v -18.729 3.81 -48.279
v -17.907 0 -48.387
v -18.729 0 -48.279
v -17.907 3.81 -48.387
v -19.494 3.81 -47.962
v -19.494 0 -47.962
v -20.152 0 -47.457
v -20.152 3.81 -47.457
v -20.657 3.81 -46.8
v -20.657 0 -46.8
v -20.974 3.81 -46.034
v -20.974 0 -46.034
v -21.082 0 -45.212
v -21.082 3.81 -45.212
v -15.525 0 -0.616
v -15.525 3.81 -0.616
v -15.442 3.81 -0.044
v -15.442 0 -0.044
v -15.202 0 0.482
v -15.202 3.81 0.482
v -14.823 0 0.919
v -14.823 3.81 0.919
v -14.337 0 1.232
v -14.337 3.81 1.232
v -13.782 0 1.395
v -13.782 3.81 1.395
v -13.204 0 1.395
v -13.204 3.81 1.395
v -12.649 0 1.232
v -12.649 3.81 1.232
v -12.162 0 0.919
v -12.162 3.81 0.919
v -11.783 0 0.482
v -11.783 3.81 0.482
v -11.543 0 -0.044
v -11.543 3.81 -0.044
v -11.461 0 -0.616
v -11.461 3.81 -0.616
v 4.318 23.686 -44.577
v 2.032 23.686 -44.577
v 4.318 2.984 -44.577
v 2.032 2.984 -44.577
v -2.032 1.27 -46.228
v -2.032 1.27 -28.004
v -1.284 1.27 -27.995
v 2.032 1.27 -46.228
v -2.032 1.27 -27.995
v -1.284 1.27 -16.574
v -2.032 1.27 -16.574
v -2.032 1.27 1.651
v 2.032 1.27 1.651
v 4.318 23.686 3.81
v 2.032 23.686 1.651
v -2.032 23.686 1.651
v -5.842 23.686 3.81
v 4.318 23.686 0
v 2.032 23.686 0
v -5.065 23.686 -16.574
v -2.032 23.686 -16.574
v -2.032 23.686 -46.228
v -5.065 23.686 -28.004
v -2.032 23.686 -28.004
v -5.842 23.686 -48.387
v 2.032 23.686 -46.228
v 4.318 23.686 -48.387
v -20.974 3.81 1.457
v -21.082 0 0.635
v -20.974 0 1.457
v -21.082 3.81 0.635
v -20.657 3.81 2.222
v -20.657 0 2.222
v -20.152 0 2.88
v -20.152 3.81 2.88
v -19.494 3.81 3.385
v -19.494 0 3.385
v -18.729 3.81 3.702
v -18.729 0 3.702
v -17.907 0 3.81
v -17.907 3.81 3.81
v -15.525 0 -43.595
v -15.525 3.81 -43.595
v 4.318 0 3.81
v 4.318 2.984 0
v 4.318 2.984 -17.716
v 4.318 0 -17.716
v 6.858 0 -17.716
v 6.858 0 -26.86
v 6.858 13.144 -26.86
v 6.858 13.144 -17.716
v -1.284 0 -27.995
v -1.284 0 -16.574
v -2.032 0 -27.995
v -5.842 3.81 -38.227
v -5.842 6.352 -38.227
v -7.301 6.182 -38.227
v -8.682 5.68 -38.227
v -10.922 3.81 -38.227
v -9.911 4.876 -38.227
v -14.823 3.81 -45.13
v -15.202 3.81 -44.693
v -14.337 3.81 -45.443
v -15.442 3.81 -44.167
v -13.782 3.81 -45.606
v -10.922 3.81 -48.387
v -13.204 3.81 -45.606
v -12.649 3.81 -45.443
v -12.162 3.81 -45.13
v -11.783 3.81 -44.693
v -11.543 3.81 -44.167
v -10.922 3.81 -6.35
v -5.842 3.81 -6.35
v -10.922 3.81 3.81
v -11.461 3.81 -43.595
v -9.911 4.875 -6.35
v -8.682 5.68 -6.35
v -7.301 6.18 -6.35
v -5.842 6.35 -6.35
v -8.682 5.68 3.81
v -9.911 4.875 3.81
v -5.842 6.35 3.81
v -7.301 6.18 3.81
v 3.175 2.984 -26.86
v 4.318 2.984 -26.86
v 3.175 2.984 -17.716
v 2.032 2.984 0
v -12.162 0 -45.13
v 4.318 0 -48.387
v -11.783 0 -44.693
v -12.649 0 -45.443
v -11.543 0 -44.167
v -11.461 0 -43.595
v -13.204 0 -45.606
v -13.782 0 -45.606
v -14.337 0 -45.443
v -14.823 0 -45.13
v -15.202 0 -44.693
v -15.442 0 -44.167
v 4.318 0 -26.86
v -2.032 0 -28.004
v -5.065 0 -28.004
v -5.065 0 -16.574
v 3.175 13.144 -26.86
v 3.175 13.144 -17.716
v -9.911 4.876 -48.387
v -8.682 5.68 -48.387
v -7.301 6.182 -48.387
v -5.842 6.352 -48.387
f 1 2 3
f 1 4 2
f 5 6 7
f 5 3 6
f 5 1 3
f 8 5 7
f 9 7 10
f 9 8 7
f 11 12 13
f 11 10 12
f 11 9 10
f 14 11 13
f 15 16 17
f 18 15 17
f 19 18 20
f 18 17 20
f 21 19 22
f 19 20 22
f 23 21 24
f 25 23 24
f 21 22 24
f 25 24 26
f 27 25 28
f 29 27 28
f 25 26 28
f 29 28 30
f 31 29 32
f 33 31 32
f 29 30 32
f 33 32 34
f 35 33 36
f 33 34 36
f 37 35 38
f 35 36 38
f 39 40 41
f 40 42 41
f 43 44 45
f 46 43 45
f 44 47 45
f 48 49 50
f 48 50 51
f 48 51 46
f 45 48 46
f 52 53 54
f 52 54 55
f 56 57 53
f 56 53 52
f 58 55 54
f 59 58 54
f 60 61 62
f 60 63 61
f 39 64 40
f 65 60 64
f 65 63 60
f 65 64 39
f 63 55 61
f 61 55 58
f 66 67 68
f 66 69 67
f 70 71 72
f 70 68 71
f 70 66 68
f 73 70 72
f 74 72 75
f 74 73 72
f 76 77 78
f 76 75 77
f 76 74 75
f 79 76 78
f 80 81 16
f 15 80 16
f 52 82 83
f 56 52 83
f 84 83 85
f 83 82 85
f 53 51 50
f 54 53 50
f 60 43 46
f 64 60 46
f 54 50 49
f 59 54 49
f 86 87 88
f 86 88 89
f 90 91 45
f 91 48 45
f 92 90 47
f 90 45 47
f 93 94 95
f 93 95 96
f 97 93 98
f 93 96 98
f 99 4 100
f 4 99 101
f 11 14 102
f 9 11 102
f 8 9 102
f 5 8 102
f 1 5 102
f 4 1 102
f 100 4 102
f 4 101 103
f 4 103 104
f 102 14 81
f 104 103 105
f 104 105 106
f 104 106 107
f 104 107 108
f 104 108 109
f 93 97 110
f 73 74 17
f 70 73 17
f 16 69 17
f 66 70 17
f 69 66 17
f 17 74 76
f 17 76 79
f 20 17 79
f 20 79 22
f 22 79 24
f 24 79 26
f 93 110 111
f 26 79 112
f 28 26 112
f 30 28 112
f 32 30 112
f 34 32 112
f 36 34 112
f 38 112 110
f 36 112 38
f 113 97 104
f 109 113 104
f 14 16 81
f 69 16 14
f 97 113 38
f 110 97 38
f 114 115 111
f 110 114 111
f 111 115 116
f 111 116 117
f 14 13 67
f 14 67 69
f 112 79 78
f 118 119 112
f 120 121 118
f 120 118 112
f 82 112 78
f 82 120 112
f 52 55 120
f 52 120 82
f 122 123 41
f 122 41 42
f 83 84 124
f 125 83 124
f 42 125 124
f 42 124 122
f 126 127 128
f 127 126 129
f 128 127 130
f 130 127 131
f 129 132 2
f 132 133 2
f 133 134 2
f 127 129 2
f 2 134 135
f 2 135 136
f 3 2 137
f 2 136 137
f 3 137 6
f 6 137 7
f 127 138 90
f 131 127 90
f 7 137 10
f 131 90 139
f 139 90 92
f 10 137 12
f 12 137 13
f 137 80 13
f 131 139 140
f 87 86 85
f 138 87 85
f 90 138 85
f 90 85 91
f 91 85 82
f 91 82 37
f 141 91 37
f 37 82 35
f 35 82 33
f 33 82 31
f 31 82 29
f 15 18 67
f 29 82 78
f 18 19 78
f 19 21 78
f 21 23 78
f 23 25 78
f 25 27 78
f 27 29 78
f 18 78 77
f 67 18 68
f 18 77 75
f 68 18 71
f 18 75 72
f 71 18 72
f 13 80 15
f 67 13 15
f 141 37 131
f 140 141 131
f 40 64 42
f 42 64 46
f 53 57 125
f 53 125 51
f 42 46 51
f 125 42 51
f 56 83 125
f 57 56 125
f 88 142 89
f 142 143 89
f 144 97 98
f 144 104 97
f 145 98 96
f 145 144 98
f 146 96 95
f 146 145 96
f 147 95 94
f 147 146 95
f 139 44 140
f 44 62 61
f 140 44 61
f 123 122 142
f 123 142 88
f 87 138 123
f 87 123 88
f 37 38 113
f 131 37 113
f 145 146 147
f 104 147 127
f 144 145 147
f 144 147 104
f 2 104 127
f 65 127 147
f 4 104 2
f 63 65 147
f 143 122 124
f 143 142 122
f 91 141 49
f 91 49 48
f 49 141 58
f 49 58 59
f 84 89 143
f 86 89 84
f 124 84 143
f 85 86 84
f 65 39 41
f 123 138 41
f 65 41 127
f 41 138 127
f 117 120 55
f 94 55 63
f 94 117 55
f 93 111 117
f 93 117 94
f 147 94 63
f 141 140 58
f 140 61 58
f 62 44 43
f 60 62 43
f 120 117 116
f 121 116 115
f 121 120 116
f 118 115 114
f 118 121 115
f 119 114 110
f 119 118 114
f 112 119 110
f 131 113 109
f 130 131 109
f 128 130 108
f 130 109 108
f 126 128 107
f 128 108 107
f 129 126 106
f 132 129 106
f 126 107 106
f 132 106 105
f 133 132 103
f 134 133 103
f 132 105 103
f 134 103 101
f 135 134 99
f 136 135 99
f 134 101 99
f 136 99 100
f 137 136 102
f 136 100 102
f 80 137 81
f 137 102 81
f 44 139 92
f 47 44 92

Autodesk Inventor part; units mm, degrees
ref_plane "YZ Plane" through (0, 0, 0) normal (1, 0, 0) x (0, 1, 0)
ref_plane "XZ Plane" through (0, 0, 0) normal (0, 1, 0) x (-1, 0, 0)
ref_plane "XY Plane" through (0, 0, 0) normal (0, 0, 1) x (1, 0, 0)
sketch "Sketch1" plane through (0, 0, 0) normal (0, 1, 0) x (-1, 0, 0)
  line L0 (0, 0) -> (2.032, 0) construction
  line L1 (0, 0) -> (-2.032, 0) construction
  line L2 (-4.318, 0) -> (-4.318, 3.81)
  line L3 (-4.318, 3.81) -> (5.842, 3.81)
  line L4 (-2.032, 0) -> (-2.032, 1.651)
  line L5 (-2.032, 1.651) -> (2.032, 1.651)
  line L6 (2.032, -46.228) -> (-2.032, -46.228)
  line L7 (-2.032, -46.228) -> (-2.032, -44.577)
  line L8 (-4.318, -44.577) -> (-4.318, -48.387)
  line L9 (-4.318, -48.387) -> (5.842, -48.387)
  line L10 (2.032, 1.651) -> (2.032, -16.5735)
  line L11 (2.032, -16.5735) -> (4.572, -16.5735)
  line L12 (4.572, -16.5735) -> (4.572, -28.0035)
  line L13 (4.572, -28.0035) -> (2.032, -28.0035)
  line L14 (2.032, -28.0035) -> (2.032, -46.228)
  line L15 (5.842, 3.81) -> (5.842, -48.387)
  line L16 (-2.032, -40.8058) -> (4.191, -40.8058) construction
  line L17 (-2.032, 0) -> (-2.032, -44.577)
  line L18 (-4.318, 0) -> (-4.318, -44.577)
  dimension "d0" = 2.032
  dimension "d1" = 2.032
  dimension "d3" = 2.286
  dimension "d5" = 3.81
  dimension "d7" = 10.16
  dimension "d8" = 4.064
  dimension "d9" = 2.159
  dimension "d10" = 1.651
  dimension "d12" = 2.286
  dimension "d13" = 3.81
  dimension "d14" = 1.651
  dimension "d15" = 4.064
  dimension "d16" = 10.16
  dimension "d17" = 11.43
  dimension "d18" = 2.159
  dimension "d19" = 18.2245
  dimension "d21" = 6.223
  dimension "d22" = 2.54
  dimension "d37" = 18.2245
  dimension "d38" = 52.197
  dimension "d39" = 44.577
extrude "Extrusion1" add sketch "Sketch1" along normal blind 2.9845
sketch "Sketch10" plane through (0, 0, 0) normal (0, -1, 0) x (1, 0, 0)
  line L0 (-2.032, 1.651) -> (-2.032, -16.5735) projected
  line L1 (2.032, -46.228) -> (2.032, 1.651) projected
  line L2 (-2.032, 1.651) -> (2.032, 1.651)
  line L3 (2.032, 1.651) -> (2.032, -46.228)
  line L4 (2.032, -46.228) -> (-2.032, -46.228)
  line L5 (-2.032, -46.228) -> (-2.032, 1.651)
  point P0 (0, 0)
extrude "Extrusion5" add sketch "Sketch10" against normal blind 1.27
sketch "Sketch11" plane through (0, 2.9845, 0) normal (0, 1, 0) x (1, 0, 0)
  line L0 (4.318, -3.81) -> (-5.842, -3.81)
  line L1 (-5.842, -3.81) -> (-5.842, 48.387) projected
  line L2 (-5.842, -3.81) -> (-5.842, 48.387)
  line L3 (4.318, 48.387) -> (4.318, 44.577) construction
  line L4 (4.318, -3.81) -> (4.318, 48.387) construction
  line L5 (4.318, -3.81) -> (4.318, 0) construction
  line L6 (4.318, -3.81) -> (4.318, 0)
  line L7 (4.318, 0) -> (2.032, 0)
  line L8 (2.032, 46.228) -> (2.032, -1.651) projected
  line L9 (2.032, -1.651) -> (-2.032, -1.651) projected
  line L10 (2.032, -1.651) -> (-2.032, -1.651)
  line L11 (-2.032, 28.0035) -> (-2.032, 16.5735) projected
  line L12 (-2.032, -1.651) -> (-2.032, 16.5735)
  line L13 (-2.032, -1.651) -> (-2.032, 16.5735) projected
  line L14 (-4.572, 16.5735) -> (-2.032, 16.5735) projected
  line L15 (-2.032, 16.5735) -> (-4.572, 16.5735)
  line L16 (-4.572, 16.5735) -> (-4.572, 28.0035) projected
  line L17 (-4.572, 16.5735) -> (-4.572, 28.0035)
  line L18 (-2.032, 28.0035) -> (-4.572, 28.0035) projected
  line L19 (-4.572, 28.0035) -> (-2.032, 28.0035)
  line L20 (-2.032, 28.0035) -> (-2.032, 46.228)
  line L21 (-2.032, 46.228) -> (2.032, 46.228)
  line L22 (2.032, 46.228) -> (2.032, 44.577)
  line L23 (2.032, 44.577) -> (4.318, 44.577)
  line L24 (4.318, 44.577) -> (4.318, 48.387)
  line L25 (-5.842, 48.387) -> (4.318, 48.387)
  point P0 (0, 0)
  dimension "d43" = 3.81
  dimension "d44" = 3.81
extrude "Extrusion6" add sketch "Sketch11" along normal blind 20.701 contours L0 L1 L25 L24 L23 L8 L21 L20 L18 L16 L14 L12 L9 L7 L6
sketch "Sketch12" plane through (-5.842, 0, 3.81) normal (0, 0, 1) x (1, 0, 0)
  line L0 (0, 0) -> (0, 23.6855) construction
  line L1 (10.16, 0) -> (0, 0) construction
  line L2 (0, 0) -> (0, 23.6855) projected
  line L3 (0, 0) -> (-6.35, 0) construction
  line L4 (0, 0) -> (0, 6.35) construction
  arc A0 (0, 6.35) -> (-6.35, 0) centre (0, 0) ccw
  line L5 (-6.35, 0) -> (0, 0)
  line L6 (0, 0) -> (0, 6.35)
  point P0 (5.842, 0)
  dimension "d54" = 6.35
  dimension "d55" = 6.35
  dimension "d56" = 6.35
extrude "Extrusion7" add sketch "Sketch12" against normal blind 10.16
sketch "Sketch14" plane through (4.318, 0, -48.387) normal (0, 0, -1) x (-1, 0, 0)
  line L0 (10.16, 0) -> (0, 0) projected
  line L1 (10.16, 0) -> (10.16, 6.3521)
  line L2 (10.16, 0) -> (10.16, 23.6855) projected
  line L3 (0, 0) -> (16.51, 0) projected
  line L4 (10.16, 0) -> (16.51, 0)
  arc A0 (16.51, 0) -> (10.16, 6.3521) centre (10.1572, -0.0008) ccw
  point P0 (4.318, 0)
extrude "Extrusion8" add sketch "Sketch14" against normal blind 10.16
sketch "Sketch16" plane through (0, 0, 0) normal (0, -1, 0) x (1, 0, 0)
  line L0 (-12.192, -38.227) -> (-5.842, -38.227) projected
  line L1 (-5.842, -38.227) -> (-21.082, -38.227)
  line L2 (-21.082, -38.227) -> (-21.082, -6.35)
  line L3 (-21.082, -6.35) -> (-5.842, -6.35)
  line L4 (-5.842, -6.35) -> (-5.842, -38.227)
  point P0 (0, 0)
  point P1 (-12.192, -6.35)
  dimension "d63" = 15.24
extrude "Extrusion9" add sketch "Sketch16" against normal blind 3.81
sketch "Sketch17" plane through (0, 3.81, 0) normal (0, 1, 0) x (1, 0, 0)
  circle A0 centre (-13.462, 29.4323) radius 1.9844
  circle A1 centre (-13.2021, 15.1448) radius 1.9844
  line L0 (-5.842, 38.227) -> (-5.842, 6.35) construction
  line L1 (-5.842, 36.0862) -> (-21.082, 36.0862) construction
  line L2 (-21.082, 38.227) -> (-21.082, 6.35) construction
  line L3 (-21.082, 37.0641) -> (-13.462, 37.0641) construction
  line L4 (-10.9221, 38.227) -> (-21.082, 38.227) construction
  line L5 (-12.933, 38.227) -> (-12.933, 6.35) construction
  line L6 (-21.082, 6.35) -> (-12.192, 6.35) construction
  line L7 (-21.082, 6.35) -> (-10.922, 6.35) construction
  line L8 (-5.842, 6.35) -> (-10.922, 6.35) construction
  line L9 (-13.462, 29.4323) -> (-13.462, 38.227) construction
  line L10 (-13.2021, 15.1448) -> (-13.2021, 6.35) construction
  point P0 (0, 0)
  dimension "d66" = 3.9688
  dimension "d67" = 3.9688
  dimension "d68" = 15.24
  dimension "d69" = 7.62
  dimension "d70" = 31.877
  dimension "d72" = 7.62
  dimension "d90" = 14.2875
extrude "Extrusion10" cut sketch "Sketch17" against normal blind 3.81
sketch "Sketch18" plane through (4.318, 0, 3.81) normal (1, 0, 0) x (0, 0, -1)
  line L0 (0, 1.944) -> (52.197, 1.944) construction
  line L1 (52.197, 0) -> (52.197, 6.3521) construction
  line L2 (0, 0) -> (0, 23.6855) construction
  line L3 (0, 2.5647) -> (21.5265, 2.5647) construction
  line L4 (48.387, 2.9845) -> (3.81, 2.9845) projected
  line L5 (21.5265, 2.9845) -> (30.6705, 2.9845)
  line L6 (21.5265, 2.9845) -> (21.5265, 13.1445)
  line L7 (21.5265, 13.1445) -> (30.6705, 13.1445)
  line L8 (30.6705, 13.1445) -> (30.6705, 2.9845)
  point P0 (3.81, 0)
  dimension "d79" = 52.197
  dimension "d80" = 21.5265
  dimension "d82" = 10.16
extrude "Extrusion11" add sketch "Sketch18" against normal blind 2.286
sketch "Sketch20" plane through (0, 23.6855, 0) normal (0, 1, 0) x (1, 0, 0)
  line L0 (-4.572, 16.5735) -> (-4.572, 28.0035) projected
  line L1 (-4.572, 28.0035) -> (-5.0647, 28.0035)
  line L2 (-5.0647, 28.0035) -> (-5.0647, 16.5735)
  line L3 (-5.0647, 16.5735) -> (-4.572, 16.5735)
  line L4 (-4.572, 16.5735) -> (-4.572, 28.0035)
  point P0 (0, 0)
extrude "Extrusion12" cut sketch "Sketch20" against normal up to next
sketch "Sketch21" plane through (0, 1.27, 0) normal (0, 1, 0) x (1, 0, 0)
  line L0 (-2.032, 16.5735) -> (-1.2835, 16.5735)
  line L1 (-1.2835, 16.5735) -> (-1.2835, 27.9949)
  line L2 (-1.2835, 27.9949) -> (-2.032, 27.9949)
  line L3 (-2.032, 27.9949) -> (-2.032, 16.5735)
  point P0 (0, 0)
extrude "Extrusion13" cut sketch "Sketch21" against normal up to next
sketch "Sketch22" plane through (0, 0, 0) normal (0, -1, 0) x (1, 0, 0)
  line L0 (2.032, -26.8605) -> (4.318, -26.8605) projected
  line L1 (4.318, -26.8605) -> (4.318, -17.6876)
  line L2 (4.318, -48.387) -> (4.318, 3.81) projected
  line L3 (4.318, -26.8605) -> (6.858, -26.8605)
  line L4 (6.858, -26.8605) -> (6.858, -17.7165)
  line L5 (6.858, -17.7165) -> (4.318, -17.7165)
  line L6 (4.318, -17.7165) -> (4.318, -26.8605)
  point P0 (0, 0)
  dimension "d91" = 2.54
extrude "Extrusion14" add sketch "Sketch22" against normal up to surface (13.1445 mm away)
sketch "Sketch23" plane through (2.032, 13.1445, -17.7165) normal (0, 1, 0) x (1, 0, 0)
  line L0 (0, 9.144) -> (4.826, 9.144) projected
  line L1 (2.286, 0) -> (0, 0) projected
  line L2 (0, 9.144) -> (1.143, 9.144)
  line L3 (1.143, 9.144) -> (1.143, 0)
  line L4 (1.143, 0) -> (0, 0)
  line L5 (0, 0) -> (0, 9.144)
  point P0 (-2.032, -17.7165)
extrude "Extrusion15" cut sketch "Sketch23" against normal up to surface (10.16 mm away)
sketch "Sketch24" plane through (-5.842, 23.6855, 3.81) normal (0, 0, 1) x (1, 0, 0)
  line L0 (0, -17.3334) -> (0, 0) projected
  line L1 (-6.35, -23.6855) -> (-15.24, -23.6855) projected
  line L2 (-15.24, -23.6855) -> (0, -23.6855)
  line L3 (-15.24, -23.6855) -> (-15.24, -19.8755) projected
  line L4 (-15.24, -23.6855) -> (-15.24, -19.8755)
  line L5 (-5.0801, -19.8755) -> (0, -19.8755) projected
  line L6 (-15.24, -19.8755) -> (0, -19.8755)
  line L7 (0, -19.8755) -> (0, -23.6855)
  point P0 (5.842, -23.6855)
sketch "Sketch25" plane through (0, 3.81, 0) normal (0, 1, 0) x (1, 0, 0)
  line L0 (-15.4123, 29.8338) -> (-11.4776, 29.4323) construction
  circle A0 centre (-13.462, 29.4323) radius 1.9844 construction
  line L1 (-15.4464, 29.4323) -> (-11.4776, 29.4323) construction
  circle A1 centre (-13.462, 29.4323) radius 1.9844 construction
  point P0 (0, 0)
extrude "Extrusion16" add sketch "Sketch24" against normal up to surface (52.197 mm away)
sketch "Sketch26" plane through (0, 3.81, 0) normal (0, 1, 0) x (1, 0, 0)
  line L0 (-13.4927, 29.4297) -> (-13.4927, 21.7166) construction
  line L1 (6.858, 26.8605) -> (6.858, 17.7165) construction
  line L2 (6.858, 22.1055) -> (-21.082, 22.1055) construction
  line L3 (-21.082, -3.81) -> (-21.082, 48.387) construction
  line L4 (-13.4927, 0.6164) -> (-13.4927, 43.5947) construction
  line L5 (-11.4607, 0.6164) -> (-11.4607, 43.5947) construction
  line L6 (-15.5247, 43.5947) -> (-15.5247, 0.6164) construction
  arc A0 (-15.5247, 0.6164) -> (-11.4607, 0.6164) centre (-13.4927, 0.6164) ccw construction
  arc A1 (-11.4607, 43.5947) -> (-15.5247, 43.5947) centre (-13.4927, 43.5947) ccw construction
  line L7 (-13.4927, 0.6164) -> (-13.4927, 43.5947) construction
  line L8 (-11.4607, 0.6164) -> (-11.4607, 43.5947)
  line L9 (-15.5247, 43.5947) -> (-15.5247, 0.6164)
  arc A2 (-15.5247, 0.6164) -> (-11.4607, 0.6164) centre (-13.4927, 0.6164) ccw
  arc A3 (-11.4607, 43.5947) -> (-15.5247, 43.5947) centre (-13.4927, 43.5947) ccw
  point P0 (0, 0)
  point P1 (-13.4927, 22.1055)
  dimension "d98" = 4.064
extrude "Extrusion17" cut sketch "Sketch26" against normal up to next
fillet "Fillet1" radius 3.175 2 edges at (-21.082, 1.905, 3.81) (-21.082, 1.905, -48.387)
properties part number "better ultrasonic holder"
